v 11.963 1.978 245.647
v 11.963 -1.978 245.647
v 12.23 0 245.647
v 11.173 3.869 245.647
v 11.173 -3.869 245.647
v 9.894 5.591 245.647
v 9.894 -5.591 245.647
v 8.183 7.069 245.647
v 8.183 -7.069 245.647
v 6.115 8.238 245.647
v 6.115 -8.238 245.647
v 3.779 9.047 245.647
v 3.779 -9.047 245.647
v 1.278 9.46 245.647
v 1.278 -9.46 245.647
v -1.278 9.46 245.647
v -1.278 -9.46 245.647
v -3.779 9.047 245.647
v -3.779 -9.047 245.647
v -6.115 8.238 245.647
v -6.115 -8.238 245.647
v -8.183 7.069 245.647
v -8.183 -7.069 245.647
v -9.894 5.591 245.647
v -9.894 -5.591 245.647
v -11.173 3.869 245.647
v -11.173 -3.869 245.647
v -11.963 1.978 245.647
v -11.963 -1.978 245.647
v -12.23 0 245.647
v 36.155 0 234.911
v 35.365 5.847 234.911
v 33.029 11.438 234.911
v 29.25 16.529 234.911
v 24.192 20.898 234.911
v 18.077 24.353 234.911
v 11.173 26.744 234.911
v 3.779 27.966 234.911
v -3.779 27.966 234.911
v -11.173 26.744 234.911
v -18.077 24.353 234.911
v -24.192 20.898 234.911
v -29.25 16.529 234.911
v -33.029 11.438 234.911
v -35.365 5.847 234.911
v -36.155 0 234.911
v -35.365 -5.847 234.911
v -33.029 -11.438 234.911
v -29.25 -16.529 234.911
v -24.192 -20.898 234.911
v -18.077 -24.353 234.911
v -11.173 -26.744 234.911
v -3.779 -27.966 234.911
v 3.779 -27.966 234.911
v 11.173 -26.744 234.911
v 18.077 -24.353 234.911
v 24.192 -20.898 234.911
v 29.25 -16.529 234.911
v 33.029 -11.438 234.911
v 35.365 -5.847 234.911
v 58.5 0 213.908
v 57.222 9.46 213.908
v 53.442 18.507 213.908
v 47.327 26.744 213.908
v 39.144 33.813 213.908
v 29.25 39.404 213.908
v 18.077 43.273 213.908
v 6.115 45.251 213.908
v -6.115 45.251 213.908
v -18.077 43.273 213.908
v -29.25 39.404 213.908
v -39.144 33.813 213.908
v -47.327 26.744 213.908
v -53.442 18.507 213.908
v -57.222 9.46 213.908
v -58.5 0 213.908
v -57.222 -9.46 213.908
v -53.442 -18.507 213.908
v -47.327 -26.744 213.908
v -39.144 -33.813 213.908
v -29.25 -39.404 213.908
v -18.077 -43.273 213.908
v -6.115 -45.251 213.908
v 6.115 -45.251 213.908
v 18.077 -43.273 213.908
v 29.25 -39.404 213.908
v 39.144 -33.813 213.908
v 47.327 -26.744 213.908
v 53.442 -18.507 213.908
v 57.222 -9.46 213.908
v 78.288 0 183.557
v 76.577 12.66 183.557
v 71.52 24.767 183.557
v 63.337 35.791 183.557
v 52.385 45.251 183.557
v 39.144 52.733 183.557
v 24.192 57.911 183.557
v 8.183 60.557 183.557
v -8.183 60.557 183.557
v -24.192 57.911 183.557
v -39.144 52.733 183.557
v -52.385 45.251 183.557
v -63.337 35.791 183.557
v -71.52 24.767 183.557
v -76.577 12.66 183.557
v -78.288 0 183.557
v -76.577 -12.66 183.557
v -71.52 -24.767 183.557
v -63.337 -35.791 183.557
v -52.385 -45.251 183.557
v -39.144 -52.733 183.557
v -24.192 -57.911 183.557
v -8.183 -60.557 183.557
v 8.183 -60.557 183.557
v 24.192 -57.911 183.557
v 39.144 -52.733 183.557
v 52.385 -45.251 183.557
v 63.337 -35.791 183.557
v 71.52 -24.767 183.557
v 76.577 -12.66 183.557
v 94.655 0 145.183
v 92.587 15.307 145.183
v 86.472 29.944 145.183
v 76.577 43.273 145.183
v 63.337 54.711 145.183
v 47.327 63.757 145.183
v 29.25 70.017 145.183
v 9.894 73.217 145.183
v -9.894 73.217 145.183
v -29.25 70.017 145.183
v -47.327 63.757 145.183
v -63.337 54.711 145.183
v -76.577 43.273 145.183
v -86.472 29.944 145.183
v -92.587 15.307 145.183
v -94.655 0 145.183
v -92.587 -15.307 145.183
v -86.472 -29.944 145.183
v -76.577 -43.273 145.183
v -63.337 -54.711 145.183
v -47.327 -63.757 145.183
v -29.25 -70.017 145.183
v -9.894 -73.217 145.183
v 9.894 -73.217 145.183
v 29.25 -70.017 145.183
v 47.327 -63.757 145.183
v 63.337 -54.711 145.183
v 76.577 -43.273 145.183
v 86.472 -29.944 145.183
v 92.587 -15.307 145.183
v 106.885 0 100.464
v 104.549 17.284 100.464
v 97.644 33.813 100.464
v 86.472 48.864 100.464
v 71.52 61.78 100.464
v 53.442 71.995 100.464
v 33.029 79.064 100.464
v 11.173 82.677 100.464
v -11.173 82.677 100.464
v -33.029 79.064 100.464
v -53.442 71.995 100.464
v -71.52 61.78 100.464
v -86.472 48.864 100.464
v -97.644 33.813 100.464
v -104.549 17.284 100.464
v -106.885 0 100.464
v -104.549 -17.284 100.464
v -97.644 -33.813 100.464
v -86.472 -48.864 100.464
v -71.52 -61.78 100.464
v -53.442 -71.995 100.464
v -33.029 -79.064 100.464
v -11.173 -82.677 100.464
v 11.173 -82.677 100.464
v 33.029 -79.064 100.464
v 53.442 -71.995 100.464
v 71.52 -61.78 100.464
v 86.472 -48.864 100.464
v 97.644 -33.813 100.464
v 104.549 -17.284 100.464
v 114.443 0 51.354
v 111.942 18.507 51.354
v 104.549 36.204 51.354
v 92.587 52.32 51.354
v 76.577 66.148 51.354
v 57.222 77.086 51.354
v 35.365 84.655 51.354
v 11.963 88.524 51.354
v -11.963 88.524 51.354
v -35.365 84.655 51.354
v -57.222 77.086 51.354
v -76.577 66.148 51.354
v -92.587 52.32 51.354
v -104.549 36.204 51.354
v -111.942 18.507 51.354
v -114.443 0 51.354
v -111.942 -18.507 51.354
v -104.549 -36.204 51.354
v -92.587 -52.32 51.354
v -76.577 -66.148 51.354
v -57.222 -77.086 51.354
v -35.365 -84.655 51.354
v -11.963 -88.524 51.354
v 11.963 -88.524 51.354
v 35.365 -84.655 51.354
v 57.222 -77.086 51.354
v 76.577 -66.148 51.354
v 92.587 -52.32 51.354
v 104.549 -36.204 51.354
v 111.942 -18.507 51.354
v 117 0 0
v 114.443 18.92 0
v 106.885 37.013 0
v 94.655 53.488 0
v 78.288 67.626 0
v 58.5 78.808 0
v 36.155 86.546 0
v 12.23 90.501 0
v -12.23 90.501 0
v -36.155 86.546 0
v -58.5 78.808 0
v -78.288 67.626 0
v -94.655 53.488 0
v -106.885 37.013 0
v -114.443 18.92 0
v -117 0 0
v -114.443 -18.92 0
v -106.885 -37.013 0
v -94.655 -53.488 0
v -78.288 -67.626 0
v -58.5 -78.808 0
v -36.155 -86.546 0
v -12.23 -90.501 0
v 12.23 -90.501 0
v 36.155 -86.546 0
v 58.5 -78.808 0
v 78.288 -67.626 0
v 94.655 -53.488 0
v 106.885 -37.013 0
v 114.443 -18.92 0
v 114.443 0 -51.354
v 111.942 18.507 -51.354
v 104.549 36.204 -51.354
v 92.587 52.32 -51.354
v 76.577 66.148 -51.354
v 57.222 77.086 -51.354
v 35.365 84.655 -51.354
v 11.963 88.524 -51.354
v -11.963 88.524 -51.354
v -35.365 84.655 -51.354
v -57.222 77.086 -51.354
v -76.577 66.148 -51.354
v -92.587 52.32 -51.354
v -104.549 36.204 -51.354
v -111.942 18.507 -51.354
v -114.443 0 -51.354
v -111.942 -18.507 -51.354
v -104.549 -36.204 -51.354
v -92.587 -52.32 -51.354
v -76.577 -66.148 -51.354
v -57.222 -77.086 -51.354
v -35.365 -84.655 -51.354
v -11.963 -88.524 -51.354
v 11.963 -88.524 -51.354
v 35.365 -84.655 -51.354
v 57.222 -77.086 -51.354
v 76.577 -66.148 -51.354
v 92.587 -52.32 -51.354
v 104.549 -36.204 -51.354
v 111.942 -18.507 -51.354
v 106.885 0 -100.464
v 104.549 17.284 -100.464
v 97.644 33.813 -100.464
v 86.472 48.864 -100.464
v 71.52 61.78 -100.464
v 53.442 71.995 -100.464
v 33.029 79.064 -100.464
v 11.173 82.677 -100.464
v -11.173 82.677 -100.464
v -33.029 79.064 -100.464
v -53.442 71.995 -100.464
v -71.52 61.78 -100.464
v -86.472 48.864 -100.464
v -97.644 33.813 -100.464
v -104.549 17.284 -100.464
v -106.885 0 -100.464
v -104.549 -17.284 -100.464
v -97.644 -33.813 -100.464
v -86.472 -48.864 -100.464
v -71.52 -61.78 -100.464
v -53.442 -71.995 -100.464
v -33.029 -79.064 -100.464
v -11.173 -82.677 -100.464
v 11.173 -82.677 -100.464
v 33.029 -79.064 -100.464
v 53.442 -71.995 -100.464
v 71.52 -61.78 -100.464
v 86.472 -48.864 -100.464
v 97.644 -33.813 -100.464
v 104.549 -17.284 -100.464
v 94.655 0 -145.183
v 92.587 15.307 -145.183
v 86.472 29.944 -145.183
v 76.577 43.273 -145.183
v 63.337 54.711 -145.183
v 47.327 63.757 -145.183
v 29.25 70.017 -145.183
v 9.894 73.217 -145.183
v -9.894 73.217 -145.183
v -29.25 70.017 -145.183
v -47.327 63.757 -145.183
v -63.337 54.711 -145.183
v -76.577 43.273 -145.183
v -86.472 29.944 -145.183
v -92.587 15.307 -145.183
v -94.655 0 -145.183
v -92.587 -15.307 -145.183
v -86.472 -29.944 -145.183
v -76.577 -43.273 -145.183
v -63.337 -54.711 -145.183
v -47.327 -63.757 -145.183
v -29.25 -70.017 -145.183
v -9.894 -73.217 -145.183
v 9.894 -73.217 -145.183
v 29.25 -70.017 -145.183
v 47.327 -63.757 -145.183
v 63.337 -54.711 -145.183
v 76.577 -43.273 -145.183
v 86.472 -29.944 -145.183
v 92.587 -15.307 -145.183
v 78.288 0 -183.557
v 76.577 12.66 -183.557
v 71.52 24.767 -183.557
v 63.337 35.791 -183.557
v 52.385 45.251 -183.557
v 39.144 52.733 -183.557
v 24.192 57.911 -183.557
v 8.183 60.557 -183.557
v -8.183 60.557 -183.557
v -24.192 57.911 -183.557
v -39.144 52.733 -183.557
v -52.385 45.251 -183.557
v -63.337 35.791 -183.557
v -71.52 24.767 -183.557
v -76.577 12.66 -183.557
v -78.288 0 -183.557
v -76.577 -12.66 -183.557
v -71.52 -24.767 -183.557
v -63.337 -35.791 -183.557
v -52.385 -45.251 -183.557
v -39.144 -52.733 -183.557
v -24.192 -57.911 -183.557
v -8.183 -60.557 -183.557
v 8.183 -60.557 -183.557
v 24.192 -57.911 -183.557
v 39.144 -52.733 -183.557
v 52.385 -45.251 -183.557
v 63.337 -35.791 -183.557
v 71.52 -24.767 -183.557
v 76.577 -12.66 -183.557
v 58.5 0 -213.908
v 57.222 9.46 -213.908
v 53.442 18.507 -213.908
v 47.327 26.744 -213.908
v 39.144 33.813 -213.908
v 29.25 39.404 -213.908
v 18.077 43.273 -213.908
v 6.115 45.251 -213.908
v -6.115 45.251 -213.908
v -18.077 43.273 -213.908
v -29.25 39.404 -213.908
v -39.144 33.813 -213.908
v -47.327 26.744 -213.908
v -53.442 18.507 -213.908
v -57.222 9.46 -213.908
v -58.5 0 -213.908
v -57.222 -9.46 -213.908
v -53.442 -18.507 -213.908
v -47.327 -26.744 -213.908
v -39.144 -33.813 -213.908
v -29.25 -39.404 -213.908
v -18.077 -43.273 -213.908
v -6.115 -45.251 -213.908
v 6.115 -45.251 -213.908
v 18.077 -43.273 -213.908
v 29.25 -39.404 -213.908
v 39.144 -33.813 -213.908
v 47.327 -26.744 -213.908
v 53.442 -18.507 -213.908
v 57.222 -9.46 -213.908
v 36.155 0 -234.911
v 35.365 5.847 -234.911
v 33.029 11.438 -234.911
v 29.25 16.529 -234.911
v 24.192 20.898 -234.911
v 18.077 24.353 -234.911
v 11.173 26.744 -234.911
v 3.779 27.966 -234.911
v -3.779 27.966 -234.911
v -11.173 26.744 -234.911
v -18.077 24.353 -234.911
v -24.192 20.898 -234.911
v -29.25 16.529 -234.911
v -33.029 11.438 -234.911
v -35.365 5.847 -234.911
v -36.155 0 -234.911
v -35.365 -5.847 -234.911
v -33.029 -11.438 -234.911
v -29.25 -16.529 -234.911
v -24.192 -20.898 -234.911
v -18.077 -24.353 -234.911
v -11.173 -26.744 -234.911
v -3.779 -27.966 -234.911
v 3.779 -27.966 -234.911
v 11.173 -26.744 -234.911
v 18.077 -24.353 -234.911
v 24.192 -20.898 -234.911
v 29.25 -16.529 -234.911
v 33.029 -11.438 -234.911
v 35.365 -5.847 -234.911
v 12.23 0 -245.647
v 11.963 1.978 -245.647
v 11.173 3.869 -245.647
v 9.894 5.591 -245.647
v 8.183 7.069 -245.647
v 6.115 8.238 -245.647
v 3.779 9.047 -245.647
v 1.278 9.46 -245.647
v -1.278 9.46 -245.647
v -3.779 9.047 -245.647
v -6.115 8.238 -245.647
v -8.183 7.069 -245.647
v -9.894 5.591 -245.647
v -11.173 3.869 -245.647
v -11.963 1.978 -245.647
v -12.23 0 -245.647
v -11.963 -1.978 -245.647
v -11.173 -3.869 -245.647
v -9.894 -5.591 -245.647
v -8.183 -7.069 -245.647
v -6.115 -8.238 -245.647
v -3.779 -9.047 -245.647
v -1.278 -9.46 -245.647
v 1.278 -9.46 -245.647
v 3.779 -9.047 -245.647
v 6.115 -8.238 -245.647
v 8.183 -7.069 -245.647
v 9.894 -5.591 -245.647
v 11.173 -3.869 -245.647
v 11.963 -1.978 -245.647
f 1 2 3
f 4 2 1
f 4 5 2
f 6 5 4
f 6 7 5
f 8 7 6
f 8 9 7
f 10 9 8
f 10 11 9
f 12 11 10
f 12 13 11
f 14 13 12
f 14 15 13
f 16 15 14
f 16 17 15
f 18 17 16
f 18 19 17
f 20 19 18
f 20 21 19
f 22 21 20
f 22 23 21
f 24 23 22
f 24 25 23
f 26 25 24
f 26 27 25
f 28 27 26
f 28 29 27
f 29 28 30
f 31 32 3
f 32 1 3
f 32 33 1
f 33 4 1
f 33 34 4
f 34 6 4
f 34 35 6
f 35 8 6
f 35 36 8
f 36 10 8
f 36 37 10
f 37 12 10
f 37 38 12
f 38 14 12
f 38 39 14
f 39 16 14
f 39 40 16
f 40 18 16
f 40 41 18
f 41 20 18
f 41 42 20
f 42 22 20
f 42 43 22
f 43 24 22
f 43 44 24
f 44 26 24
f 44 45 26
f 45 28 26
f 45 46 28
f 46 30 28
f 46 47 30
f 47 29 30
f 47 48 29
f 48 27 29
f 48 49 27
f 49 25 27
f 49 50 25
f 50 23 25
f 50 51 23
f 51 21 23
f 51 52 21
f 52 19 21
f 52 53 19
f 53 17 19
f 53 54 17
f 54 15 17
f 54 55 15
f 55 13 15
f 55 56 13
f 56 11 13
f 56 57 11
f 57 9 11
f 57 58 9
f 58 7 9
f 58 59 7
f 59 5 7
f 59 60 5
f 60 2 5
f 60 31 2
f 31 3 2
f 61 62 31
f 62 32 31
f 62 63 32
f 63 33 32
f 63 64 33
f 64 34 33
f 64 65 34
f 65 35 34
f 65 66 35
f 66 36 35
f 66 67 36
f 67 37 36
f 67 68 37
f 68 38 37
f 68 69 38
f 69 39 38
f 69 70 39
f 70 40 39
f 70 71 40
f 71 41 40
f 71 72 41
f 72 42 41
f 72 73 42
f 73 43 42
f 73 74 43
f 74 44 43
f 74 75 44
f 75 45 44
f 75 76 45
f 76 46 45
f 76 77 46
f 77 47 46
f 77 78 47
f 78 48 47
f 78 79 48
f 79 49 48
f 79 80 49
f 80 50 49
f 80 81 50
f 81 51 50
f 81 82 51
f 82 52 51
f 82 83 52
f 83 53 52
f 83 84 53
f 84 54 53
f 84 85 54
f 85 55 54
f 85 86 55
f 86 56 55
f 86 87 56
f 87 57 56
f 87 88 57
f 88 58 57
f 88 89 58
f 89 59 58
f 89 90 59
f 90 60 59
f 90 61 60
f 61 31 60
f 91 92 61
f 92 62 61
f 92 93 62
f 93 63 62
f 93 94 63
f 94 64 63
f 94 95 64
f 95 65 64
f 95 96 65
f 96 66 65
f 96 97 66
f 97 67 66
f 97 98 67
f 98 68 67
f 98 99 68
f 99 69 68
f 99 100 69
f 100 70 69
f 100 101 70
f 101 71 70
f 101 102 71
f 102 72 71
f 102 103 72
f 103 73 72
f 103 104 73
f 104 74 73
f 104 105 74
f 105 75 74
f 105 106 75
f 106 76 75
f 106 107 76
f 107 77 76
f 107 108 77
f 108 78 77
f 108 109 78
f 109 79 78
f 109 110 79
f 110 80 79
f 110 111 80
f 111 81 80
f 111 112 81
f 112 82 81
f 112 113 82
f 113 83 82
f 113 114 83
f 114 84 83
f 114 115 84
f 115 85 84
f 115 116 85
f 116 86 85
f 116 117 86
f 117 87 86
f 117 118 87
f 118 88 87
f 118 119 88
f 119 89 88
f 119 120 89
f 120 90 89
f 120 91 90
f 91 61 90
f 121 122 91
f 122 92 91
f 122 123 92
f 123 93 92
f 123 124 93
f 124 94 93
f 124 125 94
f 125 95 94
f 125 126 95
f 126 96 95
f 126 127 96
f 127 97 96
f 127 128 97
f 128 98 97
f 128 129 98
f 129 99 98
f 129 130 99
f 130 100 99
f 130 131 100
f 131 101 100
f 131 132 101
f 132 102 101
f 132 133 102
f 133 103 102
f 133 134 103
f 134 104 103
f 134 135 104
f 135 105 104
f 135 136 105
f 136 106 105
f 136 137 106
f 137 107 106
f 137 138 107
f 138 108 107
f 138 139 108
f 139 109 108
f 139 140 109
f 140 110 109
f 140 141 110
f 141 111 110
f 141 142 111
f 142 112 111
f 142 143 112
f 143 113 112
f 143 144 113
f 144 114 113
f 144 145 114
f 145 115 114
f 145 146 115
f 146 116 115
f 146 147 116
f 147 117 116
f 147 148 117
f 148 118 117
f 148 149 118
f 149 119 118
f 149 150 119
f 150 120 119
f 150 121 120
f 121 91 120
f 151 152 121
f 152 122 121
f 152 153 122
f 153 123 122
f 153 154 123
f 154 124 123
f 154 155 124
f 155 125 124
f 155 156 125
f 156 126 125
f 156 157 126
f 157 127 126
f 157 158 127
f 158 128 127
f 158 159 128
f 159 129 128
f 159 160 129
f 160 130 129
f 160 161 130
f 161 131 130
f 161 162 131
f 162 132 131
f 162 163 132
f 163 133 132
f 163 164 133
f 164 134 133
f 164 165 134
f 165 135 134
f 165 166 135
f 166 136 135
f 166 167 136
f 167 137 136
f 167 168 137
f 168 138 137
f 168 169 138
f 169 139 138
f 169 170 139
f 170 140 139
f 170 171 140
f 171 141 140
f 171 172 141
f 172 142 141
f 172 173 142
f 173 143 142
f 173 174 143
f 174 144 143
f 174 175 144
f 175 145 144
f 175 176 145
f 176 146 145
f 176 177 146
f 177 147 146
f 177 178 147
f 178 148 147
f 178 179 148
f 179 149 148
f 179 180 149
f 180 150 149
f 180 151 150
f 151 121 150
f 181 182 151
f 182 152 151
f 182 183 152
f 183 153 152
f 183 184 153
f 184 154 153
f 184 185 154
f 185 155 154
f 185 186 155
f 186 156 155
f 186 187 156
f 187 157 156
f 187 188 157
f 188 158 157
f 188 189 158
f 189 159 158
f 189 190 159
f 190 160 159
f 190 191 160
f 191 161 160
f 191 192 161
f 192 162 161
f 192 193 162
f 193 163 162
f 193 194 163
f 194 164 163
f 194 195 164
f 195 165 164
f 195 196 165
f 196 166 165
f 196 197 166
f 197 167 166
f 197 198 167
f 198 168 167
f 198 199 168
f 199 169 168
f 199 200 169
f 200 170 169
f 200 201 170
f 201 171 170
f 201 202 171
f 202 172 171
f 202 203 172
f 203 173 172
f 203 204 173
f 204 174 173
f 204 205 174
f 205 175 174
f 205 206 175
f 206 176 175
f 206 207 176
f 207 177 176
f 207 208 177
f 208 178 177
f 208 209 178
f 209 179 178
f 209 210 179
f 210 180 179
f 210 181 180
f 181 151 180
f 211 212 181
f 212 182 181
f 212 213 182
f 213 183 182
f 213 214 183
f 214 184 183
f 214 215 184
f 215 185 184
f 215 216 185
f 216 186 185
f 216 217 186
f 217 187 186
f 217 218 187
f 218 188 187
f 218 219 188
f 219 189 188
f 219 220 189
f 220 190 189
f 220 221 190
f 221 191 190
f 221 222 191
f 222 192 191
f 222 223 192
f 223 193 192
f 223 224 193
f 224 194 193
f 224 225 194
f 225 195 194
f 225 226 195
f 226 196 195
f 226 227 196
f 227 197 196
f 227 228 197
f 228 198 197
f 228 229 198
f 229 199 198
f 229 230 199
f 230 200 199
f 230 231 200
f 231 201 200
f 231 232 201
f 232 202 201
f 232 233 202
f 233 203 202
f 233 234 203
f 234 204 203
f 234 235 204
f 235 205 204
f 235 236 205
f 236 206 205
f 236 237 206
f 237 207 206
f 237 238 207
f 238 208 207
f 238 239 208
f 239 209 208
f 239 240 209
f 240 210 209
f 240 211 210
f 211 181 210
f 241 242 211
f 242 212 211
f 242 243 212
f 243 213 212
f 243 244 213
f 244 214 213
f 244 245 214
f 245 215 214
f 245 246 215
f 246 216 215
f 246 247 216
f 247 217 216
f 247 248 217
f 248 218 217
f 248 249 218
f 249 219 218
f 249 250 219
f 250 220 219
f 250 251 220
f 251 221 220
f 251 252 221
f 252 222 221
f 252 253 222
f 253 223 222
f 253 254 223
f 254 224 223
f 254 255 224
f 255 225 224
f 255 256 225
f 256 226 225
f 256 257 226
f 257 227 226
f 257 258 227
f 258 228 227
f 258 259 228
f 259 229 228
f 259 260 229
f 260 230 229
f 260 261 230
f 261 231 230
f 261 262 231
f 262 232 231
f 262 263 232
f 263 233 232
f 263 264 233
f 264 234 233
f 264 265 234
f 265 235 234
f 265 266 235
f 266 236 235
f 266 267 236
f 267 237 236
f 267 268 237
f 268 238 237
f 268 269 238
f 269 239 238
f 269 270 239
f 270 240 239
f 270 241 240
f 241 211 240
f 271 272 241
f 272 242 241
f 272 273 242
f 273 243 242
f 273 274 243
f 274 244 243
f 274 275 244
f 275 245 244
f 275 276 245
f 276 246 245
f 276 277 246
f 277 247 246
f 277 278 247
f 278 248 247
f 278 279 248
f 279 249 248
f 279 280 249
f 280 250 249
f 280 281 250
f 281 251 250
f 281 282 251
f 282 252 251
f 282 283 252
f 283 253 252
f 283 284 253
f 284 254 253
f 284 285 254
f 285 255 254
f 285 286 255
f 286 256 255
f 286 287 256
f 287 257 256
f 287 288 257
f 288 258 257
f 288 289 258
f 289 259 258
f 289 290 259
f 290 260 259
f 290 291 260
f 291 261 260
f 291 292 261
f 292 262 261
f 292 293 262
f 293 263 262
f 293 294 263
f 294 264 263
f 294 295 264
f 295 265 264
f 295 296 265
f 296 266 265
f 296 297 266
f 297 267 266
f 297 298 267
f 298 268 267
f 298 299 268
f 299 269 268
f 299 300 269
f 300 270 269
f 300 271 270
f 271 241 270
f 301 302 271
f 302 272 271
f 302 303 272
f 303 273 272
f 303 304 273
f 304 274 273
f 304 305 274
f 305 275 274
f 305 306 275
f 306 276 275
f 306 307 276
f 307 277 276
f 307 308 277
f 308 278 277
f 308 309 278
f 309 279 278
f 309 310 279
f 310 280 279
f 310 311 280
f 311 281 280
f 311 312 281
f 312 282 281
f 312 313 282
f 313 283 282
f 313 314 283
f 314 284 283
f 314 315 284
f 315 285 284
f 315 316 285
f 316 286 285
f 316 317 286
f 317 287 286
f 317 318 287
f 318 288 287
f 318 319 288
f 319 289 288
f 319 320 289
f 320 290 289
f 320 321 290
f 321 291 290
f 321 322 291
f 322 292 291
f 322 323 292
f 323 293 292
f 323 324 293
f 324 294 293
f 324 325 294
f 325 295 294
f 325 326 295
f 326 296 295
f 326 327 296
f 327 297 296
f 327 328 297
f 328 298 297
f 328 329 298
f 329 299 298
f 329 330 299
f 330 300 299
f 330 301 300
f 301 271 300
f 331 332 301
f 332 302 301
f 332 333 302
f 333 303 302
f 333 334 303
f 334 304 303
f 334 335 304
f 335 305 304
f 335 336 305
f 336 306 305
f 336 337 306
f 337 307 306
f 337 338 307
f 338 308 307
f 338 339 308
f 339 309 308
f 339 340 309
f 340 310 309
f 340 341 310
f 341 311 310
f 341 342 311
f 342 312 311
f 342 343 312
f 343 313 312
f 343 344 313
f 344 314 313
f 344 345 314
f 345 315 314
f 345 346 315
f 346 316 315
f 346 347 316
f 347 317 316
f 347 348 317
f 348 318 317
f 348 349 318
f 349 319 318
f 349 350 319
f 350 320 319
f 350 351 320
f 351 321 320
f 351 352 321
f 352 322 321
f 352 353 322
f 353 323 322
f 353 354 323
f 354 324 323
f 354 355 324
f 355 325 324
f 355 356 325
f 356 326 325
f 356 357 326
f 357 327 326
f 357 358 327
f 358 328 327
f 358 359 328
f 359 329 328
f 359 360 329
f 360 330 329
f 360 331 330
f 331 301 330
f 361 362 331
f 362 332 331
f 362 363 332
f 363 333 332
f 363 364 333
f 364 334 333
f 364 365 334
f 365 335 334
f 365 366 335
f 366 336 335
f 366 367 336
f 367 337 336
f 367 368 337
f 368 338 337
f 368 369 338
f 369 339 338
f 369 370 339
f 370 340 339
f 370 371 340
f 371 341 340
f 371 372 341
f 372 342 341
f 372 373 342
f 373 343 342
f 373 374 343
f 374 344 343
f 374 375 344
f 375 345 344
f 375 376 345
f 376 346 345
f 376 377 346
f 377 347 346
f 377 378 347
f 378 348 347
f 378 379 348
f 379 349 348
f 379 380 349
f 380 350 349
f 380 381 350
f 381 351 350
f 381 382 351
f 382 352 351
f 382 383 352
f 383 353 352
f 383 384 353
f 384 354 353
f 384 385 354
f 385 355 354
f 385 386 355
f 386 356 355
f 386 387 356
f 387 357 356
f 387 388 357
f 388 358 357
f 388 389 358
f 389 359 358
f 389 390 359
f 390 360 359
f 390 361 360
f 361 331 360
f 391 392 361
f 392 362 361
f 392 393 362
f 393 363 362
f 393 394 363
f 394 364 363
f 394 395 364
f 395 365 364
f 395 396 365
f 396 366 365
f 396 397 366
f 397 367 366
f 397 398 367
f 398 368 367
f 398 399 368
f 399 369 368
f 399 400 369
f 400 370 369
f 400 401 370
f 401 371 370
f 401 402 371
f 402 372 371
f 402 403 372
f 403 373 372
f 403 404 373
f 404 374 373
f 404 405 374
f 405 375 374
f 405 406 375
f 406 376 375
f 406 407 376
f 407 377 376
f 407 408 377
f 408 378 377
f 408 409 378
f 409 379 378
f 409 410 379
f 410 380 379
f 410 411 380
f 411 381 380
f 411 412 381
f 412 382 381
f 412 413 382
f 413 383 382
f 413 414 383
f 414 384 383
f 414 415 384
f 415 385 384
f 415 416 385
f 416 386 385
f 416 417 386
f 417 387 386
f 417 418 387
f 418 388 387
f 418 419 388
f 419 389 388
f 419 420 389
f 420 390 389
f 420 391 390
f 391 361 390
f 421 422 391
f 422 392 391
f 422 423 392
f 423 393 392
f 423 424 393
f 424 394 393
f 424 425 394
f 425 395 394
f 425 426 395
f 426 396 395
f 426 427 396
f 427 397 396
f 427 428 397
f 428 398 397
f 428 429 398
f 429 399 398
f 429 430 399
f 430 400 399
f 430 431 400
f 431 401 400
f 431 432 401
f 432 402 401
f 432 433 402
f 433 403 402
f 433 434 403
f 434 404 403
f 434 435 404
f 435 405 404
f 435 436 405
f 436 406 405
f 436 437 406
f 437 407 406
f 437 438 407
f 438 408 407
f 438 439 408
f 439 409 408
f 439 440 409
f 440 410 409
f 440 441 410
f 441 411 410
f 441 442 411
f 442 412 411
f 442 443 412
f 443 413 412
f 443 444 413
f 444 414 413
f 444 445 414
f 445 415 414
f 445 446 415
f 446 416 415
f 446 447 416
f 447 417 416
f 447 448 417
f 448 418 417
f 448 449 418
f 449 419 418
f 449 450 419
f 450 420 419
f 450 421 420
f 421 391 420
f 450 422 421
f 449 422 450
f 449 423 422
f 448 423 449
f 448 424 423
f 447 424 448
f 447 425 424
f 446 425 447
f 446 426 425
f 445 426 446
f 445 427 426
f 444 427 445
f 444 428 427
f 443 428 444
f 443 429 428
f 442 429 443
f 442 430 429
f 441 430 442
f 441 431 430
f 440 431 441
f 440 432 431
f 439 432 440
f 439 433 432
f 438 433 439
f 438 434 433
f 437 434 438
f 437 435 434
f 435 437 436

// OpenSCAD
// Generated by SolidPython 1.0.1 on 2020-07-29 00:46:48


scale(v = [9, 7, 19]) {
	sphere(r = 13);
}
/***********************************************
*********      SolidPython code:      **********
************************************************
 
# import packages: SolidPython
from solid import *
from solid.utils import *
from itertools import chain, combinations, permutations


class Resize:

    def __init__(self, scad_file):
        self.scad_file = scad_file
        #self.scad_file = import_scad(scad_file)
        # cone/cylinder param:
        self.r1 = 0
        self.r2 = 0
        self.h = 0
        # rectangular prism param:
        self.w = 0
        self.l = 0
        # ellipse param:
        self.r = 0

    # import OpenScad code (file name corresponds to shape)


    # classify shape + parameters
    def assign(self, param1, param2, param3):
        if self.scad_file == 'cone.scad':
            self.r1 = param1
            self.r2 = param2
            self.h = param3
        elif self.scad_file == 'cylinder.scad':
            self.r1 = param1
            self.r2 = param2
            self.h = param3
        elif self.scad_file == 'rectangularPrism.scad':
            self.h = param1
            self.l = param2
            self.w = param3
        else:
            self.r = param1
            self.h = param2

    # resize parameters
    def iterate(self):
        x = range(3, 20, 2)
        i = 1
        if self.scad_file == 'cone.scad':
            tempList = list(permutations(x, 2))
            for temp in tempList:
                param1 = temp[0]
                param2 = temp[1]
                filepath = 'produced_scad_files/' + 'cone' + str(param1) + '_' + str(param2) + '_' + '.scad'
                scad_render_to_file(cylinder(h=param1, r1=param2, r2=0), filepath)

        elif self.scad_file == 'cylinder.scad':
            tempList = list(permutations(x, 3))
            for temp in tempList:
                param1 = temp[0]
                param2 = temp[1]
                filepath = 'produced_scad_files/' + 'cylinder' + str(param1) + '_' + str(param2) + '_' + '.scad'
                scad_render_to_file(cylinder(h=param1, r1=param2, r2=param2), filepath)

        elif self.scad_file == 'rectangularPrism.scad':
            tempList = list(permutations(x, 3))
            for temp in tempList:
                param1 = temp[0]
                param2 = temp[1]
                param3 = temp[2]
                filepath = 'produced_scad_files/' + 'rectangularPrism' + str(param1) + '_' + str(param2) + '_' + str(
                    param3) + '.scad'
                scad_render_to_file(cube(size=(param1, param2, param3)), filepath)

        elif self.scad_file == 'ellipse.scad':
            tempList = list(permutations(x, 4))
            for temp in tempList:
                param1 = temp[0]
                param2 = temp[1]
                param3 = temp[2]
                param4 = temp[3]
                filepath = 'produced_scad_files/' + 'ellipse' + str(param1) + '_' + str(param2) + '_' + str(param3) + '_' + str(param4) + '.scad'
                scad_render_to_file(scale([param1, param2, param3])(sphere(r=param4)), filepath)

    def render_to_scadfile(self):
        scad_render_to_file(scad, 'example.scad') 
 
************************************************/
